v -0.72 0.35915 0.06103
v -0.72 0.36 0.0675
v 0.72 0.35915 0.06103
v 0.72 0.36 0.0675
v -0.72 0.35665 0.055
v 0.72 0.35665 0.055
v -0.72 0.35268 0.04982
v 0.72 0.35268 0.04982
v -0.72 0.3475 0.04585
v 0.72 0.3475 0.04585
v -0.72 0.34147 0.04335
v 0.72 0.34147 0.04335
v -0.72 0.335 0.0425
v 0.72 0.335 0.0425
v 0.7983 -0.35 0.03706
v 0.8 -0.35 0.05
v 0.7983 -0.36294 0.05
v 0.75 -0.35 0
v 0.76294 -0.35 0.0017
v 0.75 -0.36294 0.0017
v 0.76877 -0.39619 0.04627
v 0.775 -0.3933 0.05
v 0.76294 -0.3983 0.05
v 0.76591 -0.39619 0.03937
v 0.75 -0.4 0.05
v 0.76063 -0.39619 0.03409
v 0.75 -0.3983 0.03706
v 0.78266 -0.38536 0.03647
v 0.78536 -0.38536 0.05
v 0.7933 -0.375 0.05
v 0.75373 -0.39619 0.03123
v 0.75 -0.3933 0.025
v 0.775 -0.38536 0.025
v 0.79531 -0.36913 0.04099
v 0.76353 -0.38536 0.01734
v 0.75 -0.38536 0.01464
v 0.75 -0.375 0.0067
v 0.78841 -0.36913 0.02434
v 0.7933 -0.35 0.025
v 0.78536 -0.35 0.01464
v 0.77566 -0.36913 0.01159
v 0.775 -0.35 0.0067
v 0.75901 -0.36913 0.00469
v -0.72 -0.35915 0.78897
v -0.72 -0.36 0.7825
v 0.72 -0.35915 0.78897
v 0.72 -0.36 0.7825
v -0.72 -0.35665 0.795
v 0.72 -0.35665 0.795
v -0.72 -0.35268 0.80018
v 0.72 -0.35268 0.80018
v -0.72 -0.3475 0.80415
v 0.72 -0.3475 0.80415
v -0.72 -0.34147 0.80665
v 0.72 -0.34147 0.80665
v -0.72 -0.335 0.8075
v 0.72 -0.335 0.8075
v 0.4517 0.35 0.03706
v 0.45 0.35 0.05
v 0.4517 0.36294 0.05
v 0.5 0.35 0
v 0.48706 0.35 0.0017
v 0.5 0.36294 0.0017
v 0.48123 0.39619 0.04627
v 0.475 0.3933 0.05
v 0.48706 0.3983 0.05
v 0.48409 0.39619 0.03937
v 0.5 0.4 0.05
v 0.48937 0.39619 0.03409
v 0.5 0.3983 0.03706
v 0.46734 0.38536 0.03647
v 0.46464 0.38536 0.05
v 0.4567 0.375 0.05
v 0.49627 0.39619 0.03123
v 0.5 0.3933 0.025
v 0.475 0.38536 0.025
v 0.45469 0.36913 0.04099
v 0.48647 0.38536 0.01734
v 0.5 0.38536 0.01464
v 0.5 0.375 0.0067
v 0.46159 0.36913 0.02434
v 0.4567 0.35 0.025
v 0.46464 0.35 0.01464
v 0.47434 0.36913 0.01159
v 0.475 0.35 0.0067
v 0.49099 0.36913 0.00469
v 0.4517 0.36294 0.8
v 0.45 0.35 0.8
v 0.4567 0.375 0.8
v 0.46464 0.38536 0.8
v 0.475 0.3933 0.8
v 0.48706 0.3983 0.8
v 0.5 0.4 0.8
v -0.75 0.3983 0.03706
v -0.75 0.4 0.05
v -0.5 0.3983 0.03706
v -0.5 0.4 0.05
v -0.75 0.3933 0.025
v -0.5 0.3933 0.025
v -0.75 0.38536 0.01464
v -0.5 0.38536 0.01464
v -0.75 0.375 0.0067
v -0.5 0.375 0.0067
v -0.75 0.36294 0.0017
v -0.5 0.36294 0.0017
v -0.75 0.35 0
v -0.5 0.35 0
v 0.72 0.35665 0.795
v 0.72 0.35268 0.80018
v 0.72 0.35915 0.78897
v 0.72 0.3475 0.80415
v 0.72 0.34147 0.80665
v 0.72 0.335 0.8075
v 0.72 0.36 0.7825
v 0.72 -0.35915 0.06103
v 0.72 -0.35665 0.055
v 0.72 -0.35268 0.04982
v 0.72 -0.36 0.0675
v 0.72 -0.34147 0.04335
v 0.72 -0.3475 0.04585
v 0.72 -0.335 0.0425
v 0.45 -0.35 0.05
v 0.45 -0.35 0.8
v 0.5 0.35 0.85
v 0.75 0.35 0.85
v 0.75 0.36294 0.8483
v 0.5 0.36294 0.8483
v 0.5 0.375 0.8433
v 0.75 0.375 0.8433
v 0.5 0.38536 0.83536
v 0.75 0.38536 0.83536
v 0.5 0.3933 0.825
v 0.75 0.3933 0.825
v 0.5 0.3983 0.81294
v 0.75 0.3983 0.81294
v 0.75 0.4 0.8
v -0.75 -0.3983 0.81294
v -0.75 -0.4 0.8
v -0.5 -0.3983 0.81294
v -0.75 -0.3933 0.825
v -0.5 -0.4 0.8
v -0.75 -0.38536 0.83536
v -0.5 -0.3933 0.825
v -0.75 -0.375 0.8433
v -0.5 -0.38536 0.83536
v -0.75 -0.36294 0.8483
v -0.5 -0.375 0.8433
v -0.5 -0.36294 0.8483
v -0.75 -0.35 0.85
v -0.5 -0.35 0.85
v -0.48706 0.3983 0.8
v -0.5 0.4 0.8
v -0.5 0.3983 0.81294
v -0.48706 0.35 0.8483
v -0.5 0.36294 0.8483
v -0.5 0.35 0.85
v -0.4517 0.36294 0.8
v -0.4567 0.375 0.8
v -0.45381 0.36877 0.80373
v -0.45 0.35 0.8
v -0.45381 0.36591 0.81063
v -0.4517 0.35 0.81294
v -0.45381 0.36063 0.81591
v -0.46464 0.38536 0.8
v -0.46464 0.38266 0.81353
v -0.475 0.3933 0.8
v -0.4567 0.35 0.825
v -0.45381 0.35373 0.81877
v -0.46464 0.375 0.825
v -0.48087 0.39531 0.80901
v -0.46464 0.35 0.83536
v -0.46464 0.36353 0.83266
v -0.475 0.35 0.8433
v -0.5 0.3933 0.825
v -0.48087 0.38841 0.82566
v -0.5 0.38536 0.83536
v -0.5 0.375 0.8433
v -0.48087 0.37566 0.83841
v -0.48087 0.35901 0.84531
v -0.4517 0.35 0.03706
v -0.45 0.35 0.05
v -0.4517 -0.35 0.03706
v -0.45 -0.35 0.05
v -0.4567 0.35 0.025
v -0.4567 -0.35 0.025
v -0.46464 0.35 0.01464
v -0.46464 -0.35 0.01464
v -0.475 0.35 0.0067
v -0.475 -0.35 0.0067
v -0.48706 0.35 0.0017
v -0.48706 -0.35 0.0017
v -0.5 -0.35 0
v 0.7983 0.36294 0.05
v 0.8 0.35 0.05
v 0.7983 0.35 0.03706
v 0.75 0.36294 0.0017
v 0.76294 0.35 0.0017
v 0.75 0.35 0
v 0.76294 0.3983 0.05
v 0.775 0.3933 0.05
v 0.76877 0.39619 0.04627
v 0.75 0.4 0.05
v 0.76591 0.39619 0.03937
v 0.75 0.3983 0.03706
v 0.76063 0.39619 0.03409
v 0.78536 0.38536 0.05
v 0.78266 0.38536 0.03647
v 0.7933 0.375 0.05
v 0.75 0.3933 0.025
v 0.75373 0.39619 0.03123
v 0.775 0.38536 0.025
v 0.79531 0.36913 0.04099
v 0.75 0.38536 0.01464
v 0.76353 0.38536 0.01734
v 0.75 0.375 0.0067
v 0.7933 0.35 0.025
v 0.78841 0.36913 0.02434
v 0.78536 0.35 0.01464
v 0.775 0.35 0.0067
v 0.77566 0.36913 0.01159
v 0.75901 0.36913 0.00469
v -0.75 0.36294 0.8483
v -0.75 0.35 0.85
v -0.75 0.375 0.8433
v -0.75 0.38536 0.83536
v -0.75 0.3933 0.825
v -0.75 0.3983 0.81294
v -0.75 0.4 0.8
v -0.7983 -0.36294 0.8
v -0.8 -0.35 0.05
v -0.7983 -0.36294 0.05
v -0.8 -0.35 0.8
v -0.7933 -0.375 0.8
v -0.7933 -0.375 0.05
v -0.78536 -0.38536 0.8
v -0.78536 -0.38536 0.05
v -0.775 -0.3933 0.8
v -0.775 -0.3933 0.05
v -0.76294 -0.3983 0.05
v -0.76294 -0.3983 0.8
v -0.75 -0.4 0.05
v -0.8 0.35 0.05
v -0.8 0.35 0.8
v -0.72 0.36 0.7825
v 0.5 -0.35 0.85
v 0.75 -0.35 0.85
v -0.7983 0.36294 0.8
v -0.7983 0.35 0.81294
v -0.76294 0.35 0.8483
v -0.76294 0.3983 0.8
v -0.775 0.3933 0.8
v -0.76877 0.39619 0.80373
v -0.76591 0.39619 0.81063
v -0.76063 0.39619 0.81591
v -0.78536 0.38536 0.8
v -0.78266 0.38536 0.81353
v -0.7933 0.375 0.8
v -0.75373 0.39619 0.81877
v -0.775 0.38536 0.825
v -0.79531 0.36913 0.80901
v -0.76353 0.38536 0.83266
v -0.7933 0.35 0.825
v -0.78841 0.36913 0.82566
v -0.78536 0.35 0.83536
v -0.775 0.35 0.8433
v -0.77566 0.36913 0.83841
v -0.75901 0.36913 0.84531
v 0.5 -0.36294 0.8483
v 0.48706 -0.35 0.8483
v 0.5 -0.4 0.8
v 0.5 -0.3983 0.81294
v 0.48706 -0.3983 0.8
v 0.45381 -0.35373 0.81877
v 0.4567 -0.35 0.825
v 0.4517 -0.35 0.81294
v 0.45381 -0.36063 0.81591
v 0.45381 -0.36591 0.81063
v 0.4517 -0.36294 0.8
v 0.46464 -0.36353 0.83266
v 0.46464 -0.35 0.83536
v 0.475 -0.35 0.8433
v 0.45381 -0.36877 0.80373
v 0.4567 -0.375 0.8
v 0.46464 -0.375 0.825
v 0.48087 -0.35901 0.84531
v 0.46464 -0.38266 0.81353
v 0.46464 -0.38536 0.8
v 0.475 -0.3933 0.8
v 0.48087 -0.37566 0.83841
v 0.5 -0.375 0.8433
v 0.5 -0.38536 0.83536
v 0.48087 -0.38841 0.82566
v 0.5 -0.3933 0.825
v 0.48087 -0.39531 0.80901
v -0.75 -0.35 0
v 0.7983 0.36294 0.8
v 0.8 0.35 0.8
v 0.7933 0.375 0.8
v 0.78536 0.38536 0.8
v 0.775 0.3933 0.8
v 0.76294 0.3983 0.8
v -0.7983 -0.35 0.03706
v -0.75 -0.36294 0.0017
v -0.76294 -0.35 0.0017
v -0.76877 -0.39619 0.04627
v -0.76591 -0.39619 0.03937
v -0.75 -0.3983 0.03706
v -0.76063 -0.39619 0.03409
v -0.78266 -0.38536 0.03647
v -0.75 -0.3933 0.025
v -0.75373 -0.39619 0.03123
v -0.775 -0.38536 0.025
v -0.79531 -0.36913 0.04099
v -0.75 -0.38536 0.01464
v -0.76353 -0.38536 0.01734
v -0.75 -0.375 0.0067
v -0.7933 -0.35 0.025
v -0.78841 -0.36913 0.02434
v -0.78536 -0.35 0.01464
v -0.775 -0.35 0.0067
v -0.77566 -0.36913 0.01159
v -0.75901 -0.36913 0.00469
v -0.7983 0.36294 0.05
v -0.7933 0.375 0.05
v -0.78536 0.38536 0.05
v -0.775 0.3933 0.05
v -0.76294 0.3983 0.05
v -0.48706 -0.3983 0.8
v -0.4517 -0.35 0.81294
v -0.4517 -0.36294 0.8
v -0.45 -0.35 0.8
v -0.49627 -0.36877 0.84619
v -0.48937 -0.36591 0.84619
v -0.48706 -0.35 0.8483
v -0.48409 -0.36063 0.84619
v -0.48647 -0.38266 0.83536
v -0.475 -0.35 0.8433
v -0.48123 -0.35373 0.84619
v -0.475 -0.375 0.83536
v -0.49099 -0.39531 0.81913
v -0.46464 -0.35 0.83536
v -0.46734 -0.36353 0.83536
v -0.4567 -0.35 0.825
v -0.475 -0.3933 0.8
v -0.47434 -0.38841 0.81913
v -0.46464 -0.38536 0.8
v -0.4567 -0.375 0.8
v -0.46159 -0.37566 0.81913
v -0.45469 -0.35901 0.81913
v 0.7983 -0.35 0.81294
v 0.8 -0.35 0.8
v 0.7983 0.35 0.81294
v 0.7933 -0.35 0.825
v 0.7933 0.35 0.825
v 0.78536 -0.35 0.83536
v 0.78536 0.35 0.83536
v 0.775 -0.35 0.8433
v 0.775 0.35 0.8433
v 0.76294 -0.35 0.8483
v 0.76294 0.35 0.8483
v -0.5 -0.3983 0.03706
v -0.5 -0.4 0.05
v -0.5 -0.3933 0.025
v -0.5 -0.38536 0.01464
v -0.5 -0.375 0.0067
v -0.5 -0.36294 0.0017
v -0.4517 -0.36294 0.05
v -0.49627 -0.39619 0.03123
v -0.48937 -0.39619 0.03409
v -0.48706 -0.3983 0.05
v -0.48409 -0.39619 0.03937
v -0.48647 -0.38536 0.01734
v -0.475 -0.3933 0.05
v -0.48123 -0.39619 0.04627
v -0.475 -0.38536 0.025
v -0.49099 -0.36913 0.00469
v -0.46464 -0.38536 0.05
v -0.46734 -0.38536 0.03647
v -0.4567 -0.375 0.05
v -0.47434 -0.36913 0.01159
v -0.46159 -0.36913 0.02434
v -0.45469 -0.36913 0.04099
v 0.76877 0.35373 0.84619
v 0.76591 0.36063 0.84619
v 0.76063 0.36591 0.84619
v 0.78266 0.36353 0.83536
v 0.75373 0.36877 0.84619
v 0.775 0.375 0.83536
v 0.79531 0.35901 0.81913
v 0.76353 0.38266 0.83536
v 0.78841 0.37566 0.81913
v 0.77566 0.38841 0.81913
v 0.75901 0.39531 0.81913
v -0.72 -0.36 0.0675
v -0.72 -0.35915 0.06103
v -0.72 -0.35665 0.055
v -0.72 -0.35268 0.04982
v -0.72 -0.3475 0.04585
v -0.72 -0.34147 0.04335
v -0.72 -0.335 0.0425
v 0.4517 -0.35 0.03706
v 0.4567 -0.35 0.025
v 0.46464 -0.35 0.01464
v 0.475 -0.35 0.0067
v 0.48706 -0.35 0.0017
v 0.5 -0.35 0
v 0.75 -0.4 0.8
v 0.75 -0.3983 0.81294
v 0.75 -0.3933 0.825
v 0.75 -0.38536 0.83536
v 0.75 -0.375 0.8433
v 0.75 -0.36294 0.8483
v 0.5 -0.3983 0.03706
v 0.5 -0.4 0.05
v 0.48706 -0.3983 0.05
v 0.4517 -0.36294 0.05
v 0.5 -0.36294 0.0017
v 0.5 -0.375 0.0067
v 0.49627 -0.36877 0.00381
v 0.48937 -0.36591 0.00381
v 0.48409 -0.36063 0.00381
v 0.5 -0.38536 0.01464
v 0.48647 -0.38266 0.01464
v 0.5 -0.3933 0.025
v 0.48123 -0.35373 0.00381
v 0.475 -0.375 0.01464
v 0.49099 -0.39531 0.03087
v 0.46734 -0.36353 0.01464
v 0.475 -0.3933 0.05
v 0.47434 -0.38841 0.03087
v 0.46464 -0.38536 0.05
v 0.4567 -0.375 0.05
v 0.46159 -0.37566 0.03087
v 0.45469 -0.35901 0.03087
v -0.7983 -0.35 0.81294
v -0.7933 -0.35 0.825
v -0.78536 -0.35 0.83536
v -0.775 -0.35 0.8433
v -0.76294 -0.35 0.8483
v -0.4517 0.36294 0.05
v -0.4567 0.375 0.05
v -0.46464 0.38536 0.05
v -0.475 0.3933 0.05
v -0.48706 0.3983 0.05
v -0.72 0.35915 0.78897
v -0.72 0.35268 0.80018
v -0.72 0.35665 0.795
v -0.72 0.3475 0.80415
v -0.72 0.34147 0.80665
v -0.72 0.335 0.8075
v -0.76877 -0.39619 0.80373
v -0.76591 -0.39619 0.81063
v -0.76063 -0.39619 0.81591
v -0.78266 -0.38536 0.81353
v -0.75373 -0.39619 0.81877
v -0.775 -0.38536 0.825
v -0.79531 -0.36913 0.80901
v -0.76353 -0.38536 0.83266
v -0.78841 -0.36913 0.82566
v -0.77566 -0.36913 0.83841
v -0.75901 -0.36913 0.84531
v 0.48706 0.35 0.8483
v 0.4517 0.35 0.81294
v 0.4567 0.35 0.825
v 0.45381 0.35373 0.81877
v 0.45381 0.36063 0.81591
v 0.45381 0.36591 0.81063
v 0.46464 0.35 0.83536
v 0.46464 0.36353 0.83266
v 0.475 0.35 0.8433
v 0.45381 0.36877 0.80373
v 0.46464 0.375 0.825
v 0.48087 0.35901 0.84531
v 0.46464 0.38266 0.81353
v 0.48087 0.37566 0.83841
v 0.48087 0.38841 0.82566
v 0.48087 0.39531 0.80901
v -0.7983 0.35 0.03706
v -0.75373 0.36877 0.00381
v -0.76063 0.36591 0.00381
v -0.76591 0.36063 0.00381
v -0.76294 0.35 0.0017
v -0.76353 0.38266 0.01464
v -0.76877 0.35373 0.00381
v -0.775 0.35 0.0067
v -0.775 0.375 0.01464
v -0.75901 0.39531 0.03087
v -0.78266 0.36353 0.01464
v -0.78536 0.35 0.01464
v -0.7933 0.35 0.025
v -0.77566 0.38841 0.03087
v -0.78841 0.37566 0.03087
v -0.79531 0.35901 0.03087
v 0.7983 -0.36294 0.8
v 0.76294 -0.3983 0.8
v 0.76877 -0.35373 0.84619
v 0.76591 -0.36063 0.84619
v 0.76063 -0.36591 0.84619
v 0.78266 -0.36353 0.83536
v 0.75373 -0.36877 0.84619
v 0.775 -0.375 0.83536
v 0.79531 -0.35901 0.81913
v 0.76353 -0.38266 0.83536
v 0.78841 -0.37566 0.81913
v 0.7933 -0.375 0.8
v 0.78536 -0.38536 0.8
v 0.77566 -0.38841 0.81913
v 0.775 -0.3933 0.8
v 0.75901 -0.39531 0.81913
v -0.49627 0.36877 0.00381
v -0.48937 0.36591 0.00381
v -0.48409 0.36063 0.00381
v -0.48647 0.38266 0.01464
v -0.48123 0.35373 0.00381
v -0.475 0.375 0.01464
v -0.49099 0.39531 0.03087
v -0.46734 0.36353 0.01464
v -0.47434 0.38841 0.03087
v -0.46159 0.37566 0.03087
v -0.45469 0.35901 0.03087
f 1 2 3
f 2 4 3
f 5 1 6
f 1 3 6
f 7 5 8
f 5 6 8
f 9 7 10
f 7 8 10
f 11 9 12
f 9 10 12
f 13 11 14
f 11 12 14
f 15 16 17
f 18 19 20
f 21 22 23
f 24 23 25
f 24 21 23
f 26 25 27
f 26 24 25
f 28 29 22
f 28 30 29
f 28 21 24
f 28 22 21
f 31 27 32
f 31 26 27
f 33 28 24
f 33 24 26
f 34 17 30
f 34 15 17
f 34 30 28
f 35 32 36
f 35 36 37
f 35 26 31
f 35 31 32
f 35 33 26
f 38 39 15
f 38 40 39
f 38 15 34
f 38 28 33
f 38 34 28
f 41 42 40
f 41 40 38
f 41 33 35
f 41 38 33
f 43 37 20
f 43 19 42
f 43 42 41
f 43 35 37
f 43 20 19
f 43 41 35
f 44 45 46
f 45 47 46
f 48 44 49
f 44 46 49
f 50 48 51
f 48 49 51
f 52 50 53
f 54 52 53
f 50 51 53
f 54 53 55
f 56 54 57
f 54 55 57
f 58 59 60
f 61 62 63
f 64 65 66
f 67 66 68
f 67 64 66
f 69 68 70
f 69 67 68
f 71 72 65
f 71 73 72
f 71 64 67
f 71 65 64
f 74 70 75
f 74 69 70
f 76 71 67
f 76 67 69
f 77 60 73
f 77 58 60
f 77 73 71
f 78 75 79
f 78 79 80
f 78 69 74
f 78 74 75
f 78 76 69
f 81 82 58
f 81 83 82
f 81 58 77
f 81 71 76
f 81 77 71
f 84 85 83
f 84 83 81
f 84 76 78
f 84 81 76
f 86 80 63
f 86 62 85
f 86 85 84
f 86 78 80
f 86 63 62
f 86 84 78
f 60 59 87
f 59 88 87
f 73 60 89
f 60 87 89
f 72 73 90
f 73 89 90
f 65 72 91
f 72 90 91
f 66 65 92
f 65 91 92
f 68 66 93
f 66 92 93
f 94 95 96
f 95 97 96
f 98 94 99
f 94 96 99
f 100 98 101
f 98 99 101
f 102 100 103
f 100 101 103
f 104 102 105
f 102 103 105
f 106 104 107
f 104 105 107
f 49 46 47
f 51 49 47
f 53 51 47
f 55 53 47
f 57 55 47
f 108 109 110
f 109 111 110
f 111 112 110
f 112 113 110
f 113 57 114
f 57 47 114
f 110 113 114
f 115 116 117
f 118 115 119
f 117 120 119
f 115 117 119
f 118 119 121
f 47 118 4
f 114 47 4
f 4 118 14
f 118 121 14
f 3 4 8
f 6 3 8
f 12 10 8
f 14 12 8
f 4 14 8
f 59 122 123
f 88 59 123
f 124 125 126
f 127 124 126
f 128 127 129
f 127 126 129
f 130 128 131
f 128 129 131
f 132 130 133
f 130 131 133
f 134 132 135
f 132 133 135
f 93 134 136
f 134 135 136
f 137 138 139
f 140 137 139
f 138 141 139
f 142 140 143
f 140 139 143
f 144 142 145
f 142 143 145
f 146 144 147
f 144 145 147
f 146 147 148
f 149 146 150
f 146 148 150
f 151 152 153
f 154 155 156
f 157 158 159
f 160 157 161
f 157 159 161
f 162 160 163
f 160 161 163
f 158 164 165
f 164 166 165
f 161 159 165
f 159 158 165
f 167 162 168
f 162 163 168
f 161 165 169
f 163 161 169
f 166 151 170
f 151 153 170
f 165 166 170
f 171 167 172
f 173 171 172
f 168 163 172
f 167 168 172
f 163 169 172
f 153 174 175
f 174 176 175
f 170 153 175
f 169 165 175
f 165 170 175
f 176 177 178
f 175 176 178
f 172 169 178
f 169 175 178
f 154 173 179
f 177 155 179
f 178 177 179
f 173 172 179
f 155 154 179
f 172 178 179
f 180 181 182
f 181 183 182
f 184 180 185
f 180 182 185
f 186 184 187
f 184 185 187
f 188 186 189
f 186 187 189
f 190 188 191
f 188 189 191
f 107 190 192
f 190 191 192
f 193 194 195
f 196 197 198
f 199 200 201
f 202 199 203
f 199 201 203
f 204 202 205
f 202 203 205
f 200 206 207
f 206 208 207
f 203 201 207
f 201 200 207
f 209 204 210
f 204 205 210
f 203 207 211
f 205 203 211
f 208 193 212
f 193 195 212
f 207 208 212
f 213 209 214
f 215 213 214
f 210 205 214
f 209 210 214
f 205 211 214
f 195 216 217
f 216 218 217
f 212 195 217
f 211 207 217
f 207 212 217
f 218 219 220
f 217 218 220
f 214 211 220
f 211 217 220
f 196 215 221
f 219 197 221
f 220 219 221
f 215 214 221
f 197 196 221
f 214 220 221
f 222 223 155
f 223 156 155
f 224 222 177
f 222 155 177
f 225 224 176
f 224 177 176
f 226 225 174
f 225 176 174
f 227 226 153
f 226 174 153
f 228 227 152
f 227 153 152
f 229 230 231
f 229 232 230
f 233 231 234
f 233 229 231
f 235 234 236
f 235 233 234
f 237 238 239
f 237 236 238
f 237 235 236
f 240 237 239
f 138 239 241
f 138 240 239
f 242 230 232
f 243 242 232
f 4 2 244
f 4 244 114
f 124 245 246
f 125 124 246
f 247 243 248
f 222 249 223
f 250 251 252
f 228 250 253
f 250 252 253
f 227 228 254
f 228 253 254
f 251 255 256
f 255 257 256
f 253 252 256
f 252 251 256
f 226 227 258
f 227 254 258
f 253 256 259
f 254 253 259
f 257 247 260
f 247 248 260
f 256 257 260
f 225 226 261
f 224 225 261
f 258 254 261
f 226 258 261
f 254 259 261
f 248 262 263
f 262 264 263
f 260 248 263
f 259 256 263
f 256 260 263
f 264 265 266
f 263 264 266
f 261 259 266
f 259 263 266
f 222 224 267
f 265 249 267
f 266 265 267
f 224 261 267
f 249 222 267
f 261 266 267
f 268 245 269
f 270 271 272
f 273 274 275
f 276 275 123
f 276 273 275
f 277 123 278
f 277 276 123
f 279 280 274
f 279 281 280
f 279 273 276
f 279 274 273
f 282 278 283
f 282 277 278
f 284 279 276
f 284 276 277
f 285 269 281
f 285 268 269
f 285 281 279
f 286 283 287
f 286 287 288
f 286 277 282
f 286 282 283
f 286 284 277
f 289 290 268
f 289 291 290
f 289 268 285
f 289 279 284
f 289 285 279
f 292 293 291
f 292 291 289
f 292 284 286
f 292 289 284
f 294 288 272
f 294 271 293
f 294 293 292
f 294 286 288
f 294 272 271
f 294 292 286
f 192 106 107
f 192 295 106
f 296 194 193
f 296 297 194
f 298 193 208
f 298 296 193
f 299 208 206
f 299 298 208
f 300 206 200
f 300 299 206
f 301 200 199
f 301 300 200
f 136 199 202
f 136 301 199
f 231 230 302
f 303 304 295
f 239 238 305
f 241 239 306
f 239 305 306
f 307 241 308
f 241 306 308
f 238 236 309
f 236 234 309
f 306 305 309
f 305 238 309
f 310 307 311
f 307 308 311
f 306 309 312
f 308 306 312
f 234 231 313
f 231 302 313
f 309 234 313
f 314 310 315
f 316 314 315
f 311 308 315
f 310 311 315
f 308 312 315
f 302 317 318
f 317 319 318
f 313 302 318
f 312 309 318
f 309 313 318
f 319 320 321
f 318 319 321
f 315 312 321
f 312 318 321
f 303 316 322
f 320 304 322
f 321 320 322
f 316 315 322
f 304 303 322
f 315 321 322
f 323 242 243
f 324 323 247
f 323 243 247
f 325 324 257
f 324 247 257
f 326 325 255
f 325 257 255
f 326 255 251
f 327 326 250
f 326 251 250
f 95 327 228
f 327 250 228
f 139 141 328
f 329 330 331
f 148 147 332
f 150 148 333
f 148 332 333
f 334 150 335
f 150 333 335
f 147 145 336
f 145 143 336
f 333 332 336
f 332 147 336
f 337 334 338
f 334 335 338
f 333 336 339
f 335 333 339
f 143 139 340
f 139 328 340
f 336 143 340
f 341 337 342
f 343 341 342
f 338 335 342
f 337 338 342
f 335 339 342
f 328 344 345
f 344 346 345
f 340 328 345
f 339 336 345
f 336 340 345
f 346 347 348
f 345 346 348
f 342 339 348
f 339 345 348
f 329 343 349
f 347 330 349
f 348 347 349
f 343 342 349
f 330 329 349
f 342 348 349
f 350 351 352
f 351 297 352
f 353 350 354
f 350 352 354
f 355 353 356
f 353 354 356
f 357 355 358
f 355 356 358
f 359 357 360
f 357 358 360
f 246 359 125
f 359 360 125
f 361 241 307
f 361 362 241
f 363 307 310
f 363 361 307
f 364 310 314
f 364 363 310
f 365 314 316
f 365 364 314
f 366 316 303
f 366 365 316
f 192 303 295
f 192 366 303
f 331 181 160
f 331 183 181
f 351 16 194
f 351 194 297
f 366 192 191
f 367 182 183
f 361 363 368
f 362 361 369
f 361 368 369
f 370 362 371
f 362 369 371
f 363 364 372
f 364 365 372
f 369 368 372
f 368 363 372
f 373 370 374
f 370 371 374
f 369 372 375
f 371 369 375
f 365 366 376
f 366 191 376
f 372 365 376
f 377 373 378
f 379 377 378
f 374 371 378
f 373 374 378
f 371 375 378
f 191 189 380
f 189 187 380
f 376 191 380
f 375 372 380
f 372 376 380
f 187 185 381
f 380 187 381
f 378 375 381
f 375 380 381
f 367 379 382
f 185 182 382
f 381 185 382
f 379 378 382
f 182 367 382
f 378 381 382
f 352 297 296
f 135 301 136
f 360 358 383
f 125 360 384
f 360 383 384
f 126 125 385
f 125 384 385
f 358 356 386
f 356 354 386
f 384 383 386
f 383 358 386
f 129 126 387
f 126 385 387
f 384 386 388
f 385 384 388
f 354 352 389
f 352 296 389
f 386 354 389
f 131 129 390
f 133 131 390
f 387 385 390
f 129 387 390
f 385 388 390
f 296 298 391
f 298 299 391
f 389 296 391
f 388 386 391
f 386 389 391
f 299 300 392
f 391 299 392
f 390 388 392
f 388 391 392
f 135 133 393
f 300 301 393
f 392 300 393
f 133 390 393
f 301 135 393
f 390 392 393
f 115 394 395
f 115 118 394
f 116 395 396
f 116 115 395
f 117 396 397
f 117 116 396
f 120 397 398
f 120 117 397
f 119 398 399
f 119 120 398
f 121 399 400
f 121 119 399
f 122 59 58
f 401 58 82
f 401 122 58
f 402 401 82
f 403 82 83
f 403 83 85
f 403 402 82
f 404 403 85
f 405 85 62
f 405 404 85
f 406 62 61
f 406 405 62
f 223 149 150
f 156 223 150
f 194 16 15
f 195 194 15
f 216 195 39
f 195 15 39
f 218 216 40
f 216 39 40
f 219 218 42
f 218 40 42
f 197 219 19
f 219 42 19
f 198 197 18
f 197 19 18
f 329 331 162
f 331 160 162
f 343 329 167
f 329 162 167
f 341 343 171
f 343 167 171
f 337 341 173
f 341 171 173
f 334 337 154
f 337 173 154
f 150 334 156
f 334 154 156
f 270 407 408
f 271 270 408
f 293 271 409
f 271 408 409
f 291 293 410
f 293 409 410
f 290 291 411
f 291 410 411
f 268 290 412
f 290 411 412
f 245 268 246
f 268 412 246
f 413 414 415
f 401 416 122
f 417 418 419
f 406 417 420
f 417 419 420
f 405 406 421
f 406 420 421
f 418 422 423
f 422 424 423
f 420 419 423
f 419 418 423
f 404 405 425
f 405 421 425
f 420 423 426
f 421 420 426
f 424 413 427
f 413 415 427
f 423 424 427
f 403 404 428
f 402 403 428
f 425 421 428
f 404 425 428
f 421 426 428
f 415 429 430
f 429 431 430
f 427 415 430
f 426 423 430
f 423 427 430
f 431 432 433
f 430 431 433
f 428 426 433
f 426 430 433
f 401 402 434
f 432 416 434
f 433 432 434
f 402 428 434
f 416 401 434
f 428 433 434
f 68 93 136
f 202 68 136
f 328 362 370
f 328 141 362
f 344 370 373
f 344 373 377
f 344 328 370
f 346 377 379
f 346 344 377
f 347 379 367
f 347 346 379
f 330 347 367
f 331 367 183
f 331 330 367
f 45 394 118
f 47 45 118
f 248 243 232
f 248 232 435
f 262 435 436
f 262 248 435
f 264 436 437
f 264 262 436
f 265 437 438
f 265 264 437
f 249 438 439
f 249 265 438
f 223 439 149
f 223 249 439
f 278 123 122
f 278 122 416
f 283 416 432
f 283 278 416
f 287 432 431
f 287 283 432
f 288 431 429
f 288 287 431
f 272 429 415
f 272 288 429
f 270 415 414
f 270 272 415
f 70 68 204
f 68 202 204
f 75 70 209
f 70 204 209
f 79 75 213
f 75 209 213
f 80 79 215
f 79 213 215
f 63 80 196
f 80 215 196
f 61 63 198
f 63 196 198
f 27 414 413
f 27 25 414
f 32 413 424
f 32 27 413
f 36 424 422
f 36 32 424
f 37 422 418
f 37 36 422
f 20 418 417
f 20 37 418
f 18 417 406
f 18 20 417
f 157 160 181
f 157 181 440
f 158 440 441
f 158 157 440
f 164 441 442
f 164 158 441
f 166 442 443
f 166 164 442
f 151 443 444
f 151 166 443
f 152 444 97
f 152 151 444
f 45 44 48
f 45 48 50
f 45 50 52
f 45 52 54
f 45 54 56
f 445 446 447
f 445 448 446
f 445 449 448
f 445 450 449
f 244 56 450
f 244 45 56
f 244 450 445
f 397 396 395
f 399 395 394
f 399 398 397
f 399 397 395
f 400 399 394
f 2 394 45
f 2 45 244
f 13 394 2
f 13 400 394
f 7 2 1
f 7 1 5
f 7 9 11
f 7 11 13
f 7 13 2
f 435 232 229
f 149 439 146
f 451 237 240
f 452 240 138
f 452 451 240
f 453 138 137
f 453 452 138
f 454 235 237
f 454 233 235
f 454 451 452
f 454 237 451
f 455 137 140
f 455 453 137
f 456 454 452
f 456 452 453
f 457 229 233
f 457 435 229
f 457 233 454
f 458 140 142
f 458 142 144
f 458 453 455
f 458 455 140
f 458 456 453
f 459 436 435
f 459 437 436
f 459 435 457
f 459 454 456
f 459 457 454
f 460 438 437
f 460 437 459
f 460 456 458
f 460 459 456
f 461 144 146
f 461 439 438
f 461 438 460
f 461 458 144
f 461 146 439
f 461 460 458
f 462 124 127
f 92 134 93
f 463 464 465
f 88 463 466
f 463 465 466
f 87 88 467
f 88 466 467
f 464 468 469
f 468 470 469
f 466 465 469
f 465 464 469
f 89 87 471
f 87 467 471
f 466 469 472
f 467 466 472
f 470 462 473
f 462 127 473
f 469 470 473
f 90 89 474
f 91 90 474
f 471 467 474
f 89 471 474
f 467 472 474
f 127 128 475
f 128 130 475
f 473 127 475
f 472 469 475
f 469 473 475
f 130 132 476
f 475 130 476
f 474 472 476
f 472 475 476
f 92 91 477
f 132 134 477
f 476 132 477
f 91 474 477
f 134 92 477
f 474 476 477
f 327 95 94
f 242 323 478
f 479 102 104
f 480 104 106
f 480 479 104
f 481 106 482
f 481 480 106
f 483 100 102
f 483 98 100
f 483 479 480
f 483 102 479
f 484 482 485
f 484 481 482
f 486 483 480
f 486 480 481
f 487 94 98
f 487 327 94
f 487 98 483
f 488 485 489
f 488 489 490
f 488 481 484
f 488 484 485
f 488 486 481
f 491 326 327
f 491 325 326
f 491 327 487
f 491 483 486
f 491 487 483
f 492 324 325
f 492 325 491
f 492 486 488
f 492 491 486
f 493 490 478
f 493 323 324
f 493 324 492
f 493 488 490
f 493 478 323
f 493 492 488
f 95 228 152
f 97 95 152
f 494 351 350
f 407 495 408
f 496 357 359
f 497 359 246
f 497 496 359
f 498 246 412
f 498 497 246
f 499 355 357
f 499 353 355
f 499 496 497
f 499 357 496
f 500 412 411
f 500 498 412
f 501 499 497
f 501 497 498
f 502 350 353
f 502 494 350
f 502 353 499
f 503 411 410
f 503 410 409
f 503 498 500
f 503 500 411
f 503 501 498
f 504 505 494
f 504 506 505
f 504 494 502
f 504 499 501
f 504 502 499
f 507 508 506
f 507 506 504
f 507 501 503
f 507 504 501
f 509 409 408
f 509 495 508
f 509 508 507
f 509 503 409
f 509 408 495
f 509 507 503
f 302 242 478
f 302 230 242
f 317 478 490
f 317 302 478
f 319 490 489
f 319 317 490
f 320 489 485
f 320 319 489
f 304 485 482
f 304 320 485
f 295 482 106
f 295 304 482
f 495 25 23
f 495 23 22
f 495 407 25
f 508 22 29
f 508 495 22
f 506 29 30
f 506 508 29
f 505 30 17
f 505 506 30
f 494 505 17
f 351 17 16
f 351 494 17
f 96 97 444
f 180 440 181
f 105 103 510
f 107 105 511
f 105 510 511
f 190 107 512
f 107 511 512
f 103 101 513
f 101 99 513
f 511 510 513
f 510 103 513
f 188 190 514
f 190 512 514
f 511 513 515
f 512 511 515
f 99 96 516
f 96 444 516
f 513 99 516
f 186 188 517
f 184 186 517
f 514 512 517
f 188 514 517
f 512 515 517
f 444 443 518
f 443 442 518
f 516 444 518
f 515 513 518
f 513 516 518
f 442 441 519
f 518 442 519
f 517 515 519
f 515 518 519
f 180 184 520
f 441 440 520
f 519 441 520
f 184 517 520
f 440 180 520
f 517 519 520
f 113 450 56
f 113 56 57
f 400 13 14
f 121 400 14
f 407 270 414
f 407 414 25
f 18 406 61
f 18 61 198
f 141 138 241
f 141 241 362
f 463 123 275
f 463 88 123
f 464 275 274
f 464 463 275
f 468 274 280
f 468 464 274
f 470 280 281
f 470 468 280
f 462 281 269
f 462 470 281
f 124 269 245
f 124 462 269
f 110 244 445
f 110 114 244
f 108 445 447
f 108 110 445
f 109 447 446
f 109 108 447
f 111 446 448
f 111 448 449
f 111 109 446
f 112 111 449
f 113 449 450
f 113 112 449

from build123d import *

# Parameters (mm, degrees)
SKETCH_W     = 1.44
SKETCH_H     = 0.72
PAD_DEPTH    = 0.765
FILLET002_R  = 0.025
SKETCH001_W  = 0.35
SKETCH001_H  = 0.85
PAD001_DEPTH = 0.4
FILLET_R     = 0.05
SKETCH002_W  = 0.35
SKETCH002_H  = 0.85
PAD002_DEPTH = 0.4
FILLET001_R  = 0.05


with BuildPart() as body:
    # Sketch → Pad (new body)
    with BuildSketch(Plane.XY.offset(0.0425)):
        Rectangle(SKETCH_W, SKETCH_H)
    extrude(amount=PAD_DEPTH)

    # Fillet002
    fillet002_edges = [body.edges().sort_by_distance(p)[0] for p in [
        (0, -0.36, 0.8075),
        (0, 0.36, 0.8075),
        (0, -0.36, 0.0425),
        (0, 0.36, 0.0425),
    ]]
    fillet(fillet002_edges, radius=FILLET002_R)


with BuildPart() as body001:
    # Sketch001 → Pad001 (new body, symmetric)
    with BuildSketch(Plane.XZ):
        with Locations((-0.625, 0.425)):
            Rectangle(SKETCH001_W, SKETCH001_H)
    extrude(amount=PAD001_DEPTH, both=True)

    # Fillet
    fillet_edges = [body001.edges().sort_by_distance(p)[0] for p in [
        (-0.8, 0, 0.85),
        (-0.8, 0.4, 0.425),
        (-0.625, 0.4, 0.85),
        (-0.45, 0.4, 0.425),
        (-0.625, 0.4, 0),
        (-0.45, 0, 0),
        (-0.8, 0, 0),
        (-0.8, -0.4, 0.425),
        (-0.625, -0.4, 0),
        (-0.45, -0.4, 0.425),
        (-0.625, -0.4, 0.85),
        (-0.45, 0, 0.85),
    ]]
    fillet(fillet_edges, radius=FILLET_R)


with BuildPart() as body002:
    # Sketch002 → Pad002 (new body, symmetric)
    with BuildSketch(Plane.XZ):
        with Locations((0.625, 0.425)):
            Rectangle(SKETCH002_W, SKETCH002_H)
    extrude(amount=PAD002_DEPTH, both=True)

    # Fillet001
    fillet001_edges = [body002.edges().sort_by_distance(p)[0] for p in [
        (0.8, 0, 0),
        (0.8, 0.4, 0.425),
        (0.8, -0.4, 0.425),
        (0.8, 0, 0.85),
        (0.625, -0.4, 0.85),
        (0.625, 0.4, 0.85),
        (0.45, 0, 0.85),
        (0.45, -0.4, 0.425),
        (0.625, -0.4, 0),
        (0.45, 0, 0),
        (0.45, 0.4, 0.425),
        (0.625, 0.4, 0),
    ]]
    fillet(fillet001_edges, radius=FILLET001_R)


solid = Compound([body.part, body001.part, body002.part])
